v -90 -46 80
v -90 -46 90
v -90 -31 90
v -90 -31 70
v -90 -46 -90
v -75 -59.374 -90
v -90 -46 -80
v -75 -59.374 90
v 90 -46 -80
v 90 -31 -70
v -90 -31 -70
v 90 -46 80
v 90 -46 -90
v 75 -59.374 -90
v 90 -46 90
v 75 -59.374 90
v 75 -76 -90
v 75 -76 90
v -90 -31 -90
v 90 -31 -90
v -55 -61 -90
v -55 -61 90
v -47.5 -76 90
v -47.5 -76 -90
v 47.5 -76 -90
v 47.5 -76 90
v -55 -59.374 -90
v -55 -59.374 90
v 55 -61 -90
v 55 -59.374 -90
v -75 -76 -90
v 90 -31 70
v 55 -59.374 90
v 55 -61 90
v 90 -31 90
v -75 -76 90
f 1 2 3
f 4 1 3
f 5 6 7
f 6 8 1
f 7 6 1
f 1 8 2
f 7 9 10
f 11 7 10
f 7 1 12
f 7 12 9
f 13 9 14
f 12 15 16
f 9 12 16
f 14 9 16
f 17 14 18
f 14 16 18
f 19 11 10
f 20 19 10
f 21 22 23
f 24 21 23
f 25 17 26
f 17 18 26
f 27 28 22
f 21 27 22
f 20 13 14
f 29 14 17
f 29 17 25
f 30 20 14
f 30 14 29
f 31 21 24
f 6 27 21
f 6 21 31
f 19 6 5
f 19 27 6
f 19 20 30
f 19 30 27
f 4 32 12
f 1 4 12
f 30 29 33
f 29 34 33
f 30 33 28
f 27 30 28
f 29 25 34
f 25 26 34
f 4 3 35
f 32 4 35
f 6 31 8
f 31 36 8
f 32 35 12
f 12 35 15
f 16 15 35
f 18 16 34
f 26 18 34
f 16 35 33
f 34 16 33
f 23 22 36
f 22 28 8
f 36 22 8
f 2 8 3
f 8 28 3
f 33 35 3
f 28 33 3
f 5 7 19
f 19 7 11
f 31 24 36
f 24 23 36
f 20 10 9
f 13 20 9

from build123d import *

# Parameters (mm, degrees)
BOSS_EXTRUDE1_DEPTH = 90
CUT_EXTRUDE1_DEPTH  = 180


with BuildPart() as part:
    # Sketch1 → Boss-Extrude1 (new body, symmetric)
    with BuildSketch(Plane.XY):
        Polygon((-55, -61), (-47.5, -76), (-75, -76), (-75, -59.373791994), (-90, -46), (-90, -31), (90, -31), (90, -46), (75, -59.373791994), (75, -76), (47.5, -76), (55, -61), (55, -59.373791994), (-55, -59.373791994), align=None)
    extrude(amount=BOSS_EXTRUDE1_DEPTH, both=True)

    # Sketch2 → Cut-Extrude1 (cut)
    with BuildSketch(Plane(origin=(90, 0, 0), x_dir=(0, 0, -1), z_dir=(1, 0, 0))):
        Polygon((-70, -31), (-80, -46), (80, -46), (70, -31), align=None)
    extrude(amount=-CUT_EXTRUDE1_DEPTH, mode=Mode.SUBTRACT)


solid = part.part
